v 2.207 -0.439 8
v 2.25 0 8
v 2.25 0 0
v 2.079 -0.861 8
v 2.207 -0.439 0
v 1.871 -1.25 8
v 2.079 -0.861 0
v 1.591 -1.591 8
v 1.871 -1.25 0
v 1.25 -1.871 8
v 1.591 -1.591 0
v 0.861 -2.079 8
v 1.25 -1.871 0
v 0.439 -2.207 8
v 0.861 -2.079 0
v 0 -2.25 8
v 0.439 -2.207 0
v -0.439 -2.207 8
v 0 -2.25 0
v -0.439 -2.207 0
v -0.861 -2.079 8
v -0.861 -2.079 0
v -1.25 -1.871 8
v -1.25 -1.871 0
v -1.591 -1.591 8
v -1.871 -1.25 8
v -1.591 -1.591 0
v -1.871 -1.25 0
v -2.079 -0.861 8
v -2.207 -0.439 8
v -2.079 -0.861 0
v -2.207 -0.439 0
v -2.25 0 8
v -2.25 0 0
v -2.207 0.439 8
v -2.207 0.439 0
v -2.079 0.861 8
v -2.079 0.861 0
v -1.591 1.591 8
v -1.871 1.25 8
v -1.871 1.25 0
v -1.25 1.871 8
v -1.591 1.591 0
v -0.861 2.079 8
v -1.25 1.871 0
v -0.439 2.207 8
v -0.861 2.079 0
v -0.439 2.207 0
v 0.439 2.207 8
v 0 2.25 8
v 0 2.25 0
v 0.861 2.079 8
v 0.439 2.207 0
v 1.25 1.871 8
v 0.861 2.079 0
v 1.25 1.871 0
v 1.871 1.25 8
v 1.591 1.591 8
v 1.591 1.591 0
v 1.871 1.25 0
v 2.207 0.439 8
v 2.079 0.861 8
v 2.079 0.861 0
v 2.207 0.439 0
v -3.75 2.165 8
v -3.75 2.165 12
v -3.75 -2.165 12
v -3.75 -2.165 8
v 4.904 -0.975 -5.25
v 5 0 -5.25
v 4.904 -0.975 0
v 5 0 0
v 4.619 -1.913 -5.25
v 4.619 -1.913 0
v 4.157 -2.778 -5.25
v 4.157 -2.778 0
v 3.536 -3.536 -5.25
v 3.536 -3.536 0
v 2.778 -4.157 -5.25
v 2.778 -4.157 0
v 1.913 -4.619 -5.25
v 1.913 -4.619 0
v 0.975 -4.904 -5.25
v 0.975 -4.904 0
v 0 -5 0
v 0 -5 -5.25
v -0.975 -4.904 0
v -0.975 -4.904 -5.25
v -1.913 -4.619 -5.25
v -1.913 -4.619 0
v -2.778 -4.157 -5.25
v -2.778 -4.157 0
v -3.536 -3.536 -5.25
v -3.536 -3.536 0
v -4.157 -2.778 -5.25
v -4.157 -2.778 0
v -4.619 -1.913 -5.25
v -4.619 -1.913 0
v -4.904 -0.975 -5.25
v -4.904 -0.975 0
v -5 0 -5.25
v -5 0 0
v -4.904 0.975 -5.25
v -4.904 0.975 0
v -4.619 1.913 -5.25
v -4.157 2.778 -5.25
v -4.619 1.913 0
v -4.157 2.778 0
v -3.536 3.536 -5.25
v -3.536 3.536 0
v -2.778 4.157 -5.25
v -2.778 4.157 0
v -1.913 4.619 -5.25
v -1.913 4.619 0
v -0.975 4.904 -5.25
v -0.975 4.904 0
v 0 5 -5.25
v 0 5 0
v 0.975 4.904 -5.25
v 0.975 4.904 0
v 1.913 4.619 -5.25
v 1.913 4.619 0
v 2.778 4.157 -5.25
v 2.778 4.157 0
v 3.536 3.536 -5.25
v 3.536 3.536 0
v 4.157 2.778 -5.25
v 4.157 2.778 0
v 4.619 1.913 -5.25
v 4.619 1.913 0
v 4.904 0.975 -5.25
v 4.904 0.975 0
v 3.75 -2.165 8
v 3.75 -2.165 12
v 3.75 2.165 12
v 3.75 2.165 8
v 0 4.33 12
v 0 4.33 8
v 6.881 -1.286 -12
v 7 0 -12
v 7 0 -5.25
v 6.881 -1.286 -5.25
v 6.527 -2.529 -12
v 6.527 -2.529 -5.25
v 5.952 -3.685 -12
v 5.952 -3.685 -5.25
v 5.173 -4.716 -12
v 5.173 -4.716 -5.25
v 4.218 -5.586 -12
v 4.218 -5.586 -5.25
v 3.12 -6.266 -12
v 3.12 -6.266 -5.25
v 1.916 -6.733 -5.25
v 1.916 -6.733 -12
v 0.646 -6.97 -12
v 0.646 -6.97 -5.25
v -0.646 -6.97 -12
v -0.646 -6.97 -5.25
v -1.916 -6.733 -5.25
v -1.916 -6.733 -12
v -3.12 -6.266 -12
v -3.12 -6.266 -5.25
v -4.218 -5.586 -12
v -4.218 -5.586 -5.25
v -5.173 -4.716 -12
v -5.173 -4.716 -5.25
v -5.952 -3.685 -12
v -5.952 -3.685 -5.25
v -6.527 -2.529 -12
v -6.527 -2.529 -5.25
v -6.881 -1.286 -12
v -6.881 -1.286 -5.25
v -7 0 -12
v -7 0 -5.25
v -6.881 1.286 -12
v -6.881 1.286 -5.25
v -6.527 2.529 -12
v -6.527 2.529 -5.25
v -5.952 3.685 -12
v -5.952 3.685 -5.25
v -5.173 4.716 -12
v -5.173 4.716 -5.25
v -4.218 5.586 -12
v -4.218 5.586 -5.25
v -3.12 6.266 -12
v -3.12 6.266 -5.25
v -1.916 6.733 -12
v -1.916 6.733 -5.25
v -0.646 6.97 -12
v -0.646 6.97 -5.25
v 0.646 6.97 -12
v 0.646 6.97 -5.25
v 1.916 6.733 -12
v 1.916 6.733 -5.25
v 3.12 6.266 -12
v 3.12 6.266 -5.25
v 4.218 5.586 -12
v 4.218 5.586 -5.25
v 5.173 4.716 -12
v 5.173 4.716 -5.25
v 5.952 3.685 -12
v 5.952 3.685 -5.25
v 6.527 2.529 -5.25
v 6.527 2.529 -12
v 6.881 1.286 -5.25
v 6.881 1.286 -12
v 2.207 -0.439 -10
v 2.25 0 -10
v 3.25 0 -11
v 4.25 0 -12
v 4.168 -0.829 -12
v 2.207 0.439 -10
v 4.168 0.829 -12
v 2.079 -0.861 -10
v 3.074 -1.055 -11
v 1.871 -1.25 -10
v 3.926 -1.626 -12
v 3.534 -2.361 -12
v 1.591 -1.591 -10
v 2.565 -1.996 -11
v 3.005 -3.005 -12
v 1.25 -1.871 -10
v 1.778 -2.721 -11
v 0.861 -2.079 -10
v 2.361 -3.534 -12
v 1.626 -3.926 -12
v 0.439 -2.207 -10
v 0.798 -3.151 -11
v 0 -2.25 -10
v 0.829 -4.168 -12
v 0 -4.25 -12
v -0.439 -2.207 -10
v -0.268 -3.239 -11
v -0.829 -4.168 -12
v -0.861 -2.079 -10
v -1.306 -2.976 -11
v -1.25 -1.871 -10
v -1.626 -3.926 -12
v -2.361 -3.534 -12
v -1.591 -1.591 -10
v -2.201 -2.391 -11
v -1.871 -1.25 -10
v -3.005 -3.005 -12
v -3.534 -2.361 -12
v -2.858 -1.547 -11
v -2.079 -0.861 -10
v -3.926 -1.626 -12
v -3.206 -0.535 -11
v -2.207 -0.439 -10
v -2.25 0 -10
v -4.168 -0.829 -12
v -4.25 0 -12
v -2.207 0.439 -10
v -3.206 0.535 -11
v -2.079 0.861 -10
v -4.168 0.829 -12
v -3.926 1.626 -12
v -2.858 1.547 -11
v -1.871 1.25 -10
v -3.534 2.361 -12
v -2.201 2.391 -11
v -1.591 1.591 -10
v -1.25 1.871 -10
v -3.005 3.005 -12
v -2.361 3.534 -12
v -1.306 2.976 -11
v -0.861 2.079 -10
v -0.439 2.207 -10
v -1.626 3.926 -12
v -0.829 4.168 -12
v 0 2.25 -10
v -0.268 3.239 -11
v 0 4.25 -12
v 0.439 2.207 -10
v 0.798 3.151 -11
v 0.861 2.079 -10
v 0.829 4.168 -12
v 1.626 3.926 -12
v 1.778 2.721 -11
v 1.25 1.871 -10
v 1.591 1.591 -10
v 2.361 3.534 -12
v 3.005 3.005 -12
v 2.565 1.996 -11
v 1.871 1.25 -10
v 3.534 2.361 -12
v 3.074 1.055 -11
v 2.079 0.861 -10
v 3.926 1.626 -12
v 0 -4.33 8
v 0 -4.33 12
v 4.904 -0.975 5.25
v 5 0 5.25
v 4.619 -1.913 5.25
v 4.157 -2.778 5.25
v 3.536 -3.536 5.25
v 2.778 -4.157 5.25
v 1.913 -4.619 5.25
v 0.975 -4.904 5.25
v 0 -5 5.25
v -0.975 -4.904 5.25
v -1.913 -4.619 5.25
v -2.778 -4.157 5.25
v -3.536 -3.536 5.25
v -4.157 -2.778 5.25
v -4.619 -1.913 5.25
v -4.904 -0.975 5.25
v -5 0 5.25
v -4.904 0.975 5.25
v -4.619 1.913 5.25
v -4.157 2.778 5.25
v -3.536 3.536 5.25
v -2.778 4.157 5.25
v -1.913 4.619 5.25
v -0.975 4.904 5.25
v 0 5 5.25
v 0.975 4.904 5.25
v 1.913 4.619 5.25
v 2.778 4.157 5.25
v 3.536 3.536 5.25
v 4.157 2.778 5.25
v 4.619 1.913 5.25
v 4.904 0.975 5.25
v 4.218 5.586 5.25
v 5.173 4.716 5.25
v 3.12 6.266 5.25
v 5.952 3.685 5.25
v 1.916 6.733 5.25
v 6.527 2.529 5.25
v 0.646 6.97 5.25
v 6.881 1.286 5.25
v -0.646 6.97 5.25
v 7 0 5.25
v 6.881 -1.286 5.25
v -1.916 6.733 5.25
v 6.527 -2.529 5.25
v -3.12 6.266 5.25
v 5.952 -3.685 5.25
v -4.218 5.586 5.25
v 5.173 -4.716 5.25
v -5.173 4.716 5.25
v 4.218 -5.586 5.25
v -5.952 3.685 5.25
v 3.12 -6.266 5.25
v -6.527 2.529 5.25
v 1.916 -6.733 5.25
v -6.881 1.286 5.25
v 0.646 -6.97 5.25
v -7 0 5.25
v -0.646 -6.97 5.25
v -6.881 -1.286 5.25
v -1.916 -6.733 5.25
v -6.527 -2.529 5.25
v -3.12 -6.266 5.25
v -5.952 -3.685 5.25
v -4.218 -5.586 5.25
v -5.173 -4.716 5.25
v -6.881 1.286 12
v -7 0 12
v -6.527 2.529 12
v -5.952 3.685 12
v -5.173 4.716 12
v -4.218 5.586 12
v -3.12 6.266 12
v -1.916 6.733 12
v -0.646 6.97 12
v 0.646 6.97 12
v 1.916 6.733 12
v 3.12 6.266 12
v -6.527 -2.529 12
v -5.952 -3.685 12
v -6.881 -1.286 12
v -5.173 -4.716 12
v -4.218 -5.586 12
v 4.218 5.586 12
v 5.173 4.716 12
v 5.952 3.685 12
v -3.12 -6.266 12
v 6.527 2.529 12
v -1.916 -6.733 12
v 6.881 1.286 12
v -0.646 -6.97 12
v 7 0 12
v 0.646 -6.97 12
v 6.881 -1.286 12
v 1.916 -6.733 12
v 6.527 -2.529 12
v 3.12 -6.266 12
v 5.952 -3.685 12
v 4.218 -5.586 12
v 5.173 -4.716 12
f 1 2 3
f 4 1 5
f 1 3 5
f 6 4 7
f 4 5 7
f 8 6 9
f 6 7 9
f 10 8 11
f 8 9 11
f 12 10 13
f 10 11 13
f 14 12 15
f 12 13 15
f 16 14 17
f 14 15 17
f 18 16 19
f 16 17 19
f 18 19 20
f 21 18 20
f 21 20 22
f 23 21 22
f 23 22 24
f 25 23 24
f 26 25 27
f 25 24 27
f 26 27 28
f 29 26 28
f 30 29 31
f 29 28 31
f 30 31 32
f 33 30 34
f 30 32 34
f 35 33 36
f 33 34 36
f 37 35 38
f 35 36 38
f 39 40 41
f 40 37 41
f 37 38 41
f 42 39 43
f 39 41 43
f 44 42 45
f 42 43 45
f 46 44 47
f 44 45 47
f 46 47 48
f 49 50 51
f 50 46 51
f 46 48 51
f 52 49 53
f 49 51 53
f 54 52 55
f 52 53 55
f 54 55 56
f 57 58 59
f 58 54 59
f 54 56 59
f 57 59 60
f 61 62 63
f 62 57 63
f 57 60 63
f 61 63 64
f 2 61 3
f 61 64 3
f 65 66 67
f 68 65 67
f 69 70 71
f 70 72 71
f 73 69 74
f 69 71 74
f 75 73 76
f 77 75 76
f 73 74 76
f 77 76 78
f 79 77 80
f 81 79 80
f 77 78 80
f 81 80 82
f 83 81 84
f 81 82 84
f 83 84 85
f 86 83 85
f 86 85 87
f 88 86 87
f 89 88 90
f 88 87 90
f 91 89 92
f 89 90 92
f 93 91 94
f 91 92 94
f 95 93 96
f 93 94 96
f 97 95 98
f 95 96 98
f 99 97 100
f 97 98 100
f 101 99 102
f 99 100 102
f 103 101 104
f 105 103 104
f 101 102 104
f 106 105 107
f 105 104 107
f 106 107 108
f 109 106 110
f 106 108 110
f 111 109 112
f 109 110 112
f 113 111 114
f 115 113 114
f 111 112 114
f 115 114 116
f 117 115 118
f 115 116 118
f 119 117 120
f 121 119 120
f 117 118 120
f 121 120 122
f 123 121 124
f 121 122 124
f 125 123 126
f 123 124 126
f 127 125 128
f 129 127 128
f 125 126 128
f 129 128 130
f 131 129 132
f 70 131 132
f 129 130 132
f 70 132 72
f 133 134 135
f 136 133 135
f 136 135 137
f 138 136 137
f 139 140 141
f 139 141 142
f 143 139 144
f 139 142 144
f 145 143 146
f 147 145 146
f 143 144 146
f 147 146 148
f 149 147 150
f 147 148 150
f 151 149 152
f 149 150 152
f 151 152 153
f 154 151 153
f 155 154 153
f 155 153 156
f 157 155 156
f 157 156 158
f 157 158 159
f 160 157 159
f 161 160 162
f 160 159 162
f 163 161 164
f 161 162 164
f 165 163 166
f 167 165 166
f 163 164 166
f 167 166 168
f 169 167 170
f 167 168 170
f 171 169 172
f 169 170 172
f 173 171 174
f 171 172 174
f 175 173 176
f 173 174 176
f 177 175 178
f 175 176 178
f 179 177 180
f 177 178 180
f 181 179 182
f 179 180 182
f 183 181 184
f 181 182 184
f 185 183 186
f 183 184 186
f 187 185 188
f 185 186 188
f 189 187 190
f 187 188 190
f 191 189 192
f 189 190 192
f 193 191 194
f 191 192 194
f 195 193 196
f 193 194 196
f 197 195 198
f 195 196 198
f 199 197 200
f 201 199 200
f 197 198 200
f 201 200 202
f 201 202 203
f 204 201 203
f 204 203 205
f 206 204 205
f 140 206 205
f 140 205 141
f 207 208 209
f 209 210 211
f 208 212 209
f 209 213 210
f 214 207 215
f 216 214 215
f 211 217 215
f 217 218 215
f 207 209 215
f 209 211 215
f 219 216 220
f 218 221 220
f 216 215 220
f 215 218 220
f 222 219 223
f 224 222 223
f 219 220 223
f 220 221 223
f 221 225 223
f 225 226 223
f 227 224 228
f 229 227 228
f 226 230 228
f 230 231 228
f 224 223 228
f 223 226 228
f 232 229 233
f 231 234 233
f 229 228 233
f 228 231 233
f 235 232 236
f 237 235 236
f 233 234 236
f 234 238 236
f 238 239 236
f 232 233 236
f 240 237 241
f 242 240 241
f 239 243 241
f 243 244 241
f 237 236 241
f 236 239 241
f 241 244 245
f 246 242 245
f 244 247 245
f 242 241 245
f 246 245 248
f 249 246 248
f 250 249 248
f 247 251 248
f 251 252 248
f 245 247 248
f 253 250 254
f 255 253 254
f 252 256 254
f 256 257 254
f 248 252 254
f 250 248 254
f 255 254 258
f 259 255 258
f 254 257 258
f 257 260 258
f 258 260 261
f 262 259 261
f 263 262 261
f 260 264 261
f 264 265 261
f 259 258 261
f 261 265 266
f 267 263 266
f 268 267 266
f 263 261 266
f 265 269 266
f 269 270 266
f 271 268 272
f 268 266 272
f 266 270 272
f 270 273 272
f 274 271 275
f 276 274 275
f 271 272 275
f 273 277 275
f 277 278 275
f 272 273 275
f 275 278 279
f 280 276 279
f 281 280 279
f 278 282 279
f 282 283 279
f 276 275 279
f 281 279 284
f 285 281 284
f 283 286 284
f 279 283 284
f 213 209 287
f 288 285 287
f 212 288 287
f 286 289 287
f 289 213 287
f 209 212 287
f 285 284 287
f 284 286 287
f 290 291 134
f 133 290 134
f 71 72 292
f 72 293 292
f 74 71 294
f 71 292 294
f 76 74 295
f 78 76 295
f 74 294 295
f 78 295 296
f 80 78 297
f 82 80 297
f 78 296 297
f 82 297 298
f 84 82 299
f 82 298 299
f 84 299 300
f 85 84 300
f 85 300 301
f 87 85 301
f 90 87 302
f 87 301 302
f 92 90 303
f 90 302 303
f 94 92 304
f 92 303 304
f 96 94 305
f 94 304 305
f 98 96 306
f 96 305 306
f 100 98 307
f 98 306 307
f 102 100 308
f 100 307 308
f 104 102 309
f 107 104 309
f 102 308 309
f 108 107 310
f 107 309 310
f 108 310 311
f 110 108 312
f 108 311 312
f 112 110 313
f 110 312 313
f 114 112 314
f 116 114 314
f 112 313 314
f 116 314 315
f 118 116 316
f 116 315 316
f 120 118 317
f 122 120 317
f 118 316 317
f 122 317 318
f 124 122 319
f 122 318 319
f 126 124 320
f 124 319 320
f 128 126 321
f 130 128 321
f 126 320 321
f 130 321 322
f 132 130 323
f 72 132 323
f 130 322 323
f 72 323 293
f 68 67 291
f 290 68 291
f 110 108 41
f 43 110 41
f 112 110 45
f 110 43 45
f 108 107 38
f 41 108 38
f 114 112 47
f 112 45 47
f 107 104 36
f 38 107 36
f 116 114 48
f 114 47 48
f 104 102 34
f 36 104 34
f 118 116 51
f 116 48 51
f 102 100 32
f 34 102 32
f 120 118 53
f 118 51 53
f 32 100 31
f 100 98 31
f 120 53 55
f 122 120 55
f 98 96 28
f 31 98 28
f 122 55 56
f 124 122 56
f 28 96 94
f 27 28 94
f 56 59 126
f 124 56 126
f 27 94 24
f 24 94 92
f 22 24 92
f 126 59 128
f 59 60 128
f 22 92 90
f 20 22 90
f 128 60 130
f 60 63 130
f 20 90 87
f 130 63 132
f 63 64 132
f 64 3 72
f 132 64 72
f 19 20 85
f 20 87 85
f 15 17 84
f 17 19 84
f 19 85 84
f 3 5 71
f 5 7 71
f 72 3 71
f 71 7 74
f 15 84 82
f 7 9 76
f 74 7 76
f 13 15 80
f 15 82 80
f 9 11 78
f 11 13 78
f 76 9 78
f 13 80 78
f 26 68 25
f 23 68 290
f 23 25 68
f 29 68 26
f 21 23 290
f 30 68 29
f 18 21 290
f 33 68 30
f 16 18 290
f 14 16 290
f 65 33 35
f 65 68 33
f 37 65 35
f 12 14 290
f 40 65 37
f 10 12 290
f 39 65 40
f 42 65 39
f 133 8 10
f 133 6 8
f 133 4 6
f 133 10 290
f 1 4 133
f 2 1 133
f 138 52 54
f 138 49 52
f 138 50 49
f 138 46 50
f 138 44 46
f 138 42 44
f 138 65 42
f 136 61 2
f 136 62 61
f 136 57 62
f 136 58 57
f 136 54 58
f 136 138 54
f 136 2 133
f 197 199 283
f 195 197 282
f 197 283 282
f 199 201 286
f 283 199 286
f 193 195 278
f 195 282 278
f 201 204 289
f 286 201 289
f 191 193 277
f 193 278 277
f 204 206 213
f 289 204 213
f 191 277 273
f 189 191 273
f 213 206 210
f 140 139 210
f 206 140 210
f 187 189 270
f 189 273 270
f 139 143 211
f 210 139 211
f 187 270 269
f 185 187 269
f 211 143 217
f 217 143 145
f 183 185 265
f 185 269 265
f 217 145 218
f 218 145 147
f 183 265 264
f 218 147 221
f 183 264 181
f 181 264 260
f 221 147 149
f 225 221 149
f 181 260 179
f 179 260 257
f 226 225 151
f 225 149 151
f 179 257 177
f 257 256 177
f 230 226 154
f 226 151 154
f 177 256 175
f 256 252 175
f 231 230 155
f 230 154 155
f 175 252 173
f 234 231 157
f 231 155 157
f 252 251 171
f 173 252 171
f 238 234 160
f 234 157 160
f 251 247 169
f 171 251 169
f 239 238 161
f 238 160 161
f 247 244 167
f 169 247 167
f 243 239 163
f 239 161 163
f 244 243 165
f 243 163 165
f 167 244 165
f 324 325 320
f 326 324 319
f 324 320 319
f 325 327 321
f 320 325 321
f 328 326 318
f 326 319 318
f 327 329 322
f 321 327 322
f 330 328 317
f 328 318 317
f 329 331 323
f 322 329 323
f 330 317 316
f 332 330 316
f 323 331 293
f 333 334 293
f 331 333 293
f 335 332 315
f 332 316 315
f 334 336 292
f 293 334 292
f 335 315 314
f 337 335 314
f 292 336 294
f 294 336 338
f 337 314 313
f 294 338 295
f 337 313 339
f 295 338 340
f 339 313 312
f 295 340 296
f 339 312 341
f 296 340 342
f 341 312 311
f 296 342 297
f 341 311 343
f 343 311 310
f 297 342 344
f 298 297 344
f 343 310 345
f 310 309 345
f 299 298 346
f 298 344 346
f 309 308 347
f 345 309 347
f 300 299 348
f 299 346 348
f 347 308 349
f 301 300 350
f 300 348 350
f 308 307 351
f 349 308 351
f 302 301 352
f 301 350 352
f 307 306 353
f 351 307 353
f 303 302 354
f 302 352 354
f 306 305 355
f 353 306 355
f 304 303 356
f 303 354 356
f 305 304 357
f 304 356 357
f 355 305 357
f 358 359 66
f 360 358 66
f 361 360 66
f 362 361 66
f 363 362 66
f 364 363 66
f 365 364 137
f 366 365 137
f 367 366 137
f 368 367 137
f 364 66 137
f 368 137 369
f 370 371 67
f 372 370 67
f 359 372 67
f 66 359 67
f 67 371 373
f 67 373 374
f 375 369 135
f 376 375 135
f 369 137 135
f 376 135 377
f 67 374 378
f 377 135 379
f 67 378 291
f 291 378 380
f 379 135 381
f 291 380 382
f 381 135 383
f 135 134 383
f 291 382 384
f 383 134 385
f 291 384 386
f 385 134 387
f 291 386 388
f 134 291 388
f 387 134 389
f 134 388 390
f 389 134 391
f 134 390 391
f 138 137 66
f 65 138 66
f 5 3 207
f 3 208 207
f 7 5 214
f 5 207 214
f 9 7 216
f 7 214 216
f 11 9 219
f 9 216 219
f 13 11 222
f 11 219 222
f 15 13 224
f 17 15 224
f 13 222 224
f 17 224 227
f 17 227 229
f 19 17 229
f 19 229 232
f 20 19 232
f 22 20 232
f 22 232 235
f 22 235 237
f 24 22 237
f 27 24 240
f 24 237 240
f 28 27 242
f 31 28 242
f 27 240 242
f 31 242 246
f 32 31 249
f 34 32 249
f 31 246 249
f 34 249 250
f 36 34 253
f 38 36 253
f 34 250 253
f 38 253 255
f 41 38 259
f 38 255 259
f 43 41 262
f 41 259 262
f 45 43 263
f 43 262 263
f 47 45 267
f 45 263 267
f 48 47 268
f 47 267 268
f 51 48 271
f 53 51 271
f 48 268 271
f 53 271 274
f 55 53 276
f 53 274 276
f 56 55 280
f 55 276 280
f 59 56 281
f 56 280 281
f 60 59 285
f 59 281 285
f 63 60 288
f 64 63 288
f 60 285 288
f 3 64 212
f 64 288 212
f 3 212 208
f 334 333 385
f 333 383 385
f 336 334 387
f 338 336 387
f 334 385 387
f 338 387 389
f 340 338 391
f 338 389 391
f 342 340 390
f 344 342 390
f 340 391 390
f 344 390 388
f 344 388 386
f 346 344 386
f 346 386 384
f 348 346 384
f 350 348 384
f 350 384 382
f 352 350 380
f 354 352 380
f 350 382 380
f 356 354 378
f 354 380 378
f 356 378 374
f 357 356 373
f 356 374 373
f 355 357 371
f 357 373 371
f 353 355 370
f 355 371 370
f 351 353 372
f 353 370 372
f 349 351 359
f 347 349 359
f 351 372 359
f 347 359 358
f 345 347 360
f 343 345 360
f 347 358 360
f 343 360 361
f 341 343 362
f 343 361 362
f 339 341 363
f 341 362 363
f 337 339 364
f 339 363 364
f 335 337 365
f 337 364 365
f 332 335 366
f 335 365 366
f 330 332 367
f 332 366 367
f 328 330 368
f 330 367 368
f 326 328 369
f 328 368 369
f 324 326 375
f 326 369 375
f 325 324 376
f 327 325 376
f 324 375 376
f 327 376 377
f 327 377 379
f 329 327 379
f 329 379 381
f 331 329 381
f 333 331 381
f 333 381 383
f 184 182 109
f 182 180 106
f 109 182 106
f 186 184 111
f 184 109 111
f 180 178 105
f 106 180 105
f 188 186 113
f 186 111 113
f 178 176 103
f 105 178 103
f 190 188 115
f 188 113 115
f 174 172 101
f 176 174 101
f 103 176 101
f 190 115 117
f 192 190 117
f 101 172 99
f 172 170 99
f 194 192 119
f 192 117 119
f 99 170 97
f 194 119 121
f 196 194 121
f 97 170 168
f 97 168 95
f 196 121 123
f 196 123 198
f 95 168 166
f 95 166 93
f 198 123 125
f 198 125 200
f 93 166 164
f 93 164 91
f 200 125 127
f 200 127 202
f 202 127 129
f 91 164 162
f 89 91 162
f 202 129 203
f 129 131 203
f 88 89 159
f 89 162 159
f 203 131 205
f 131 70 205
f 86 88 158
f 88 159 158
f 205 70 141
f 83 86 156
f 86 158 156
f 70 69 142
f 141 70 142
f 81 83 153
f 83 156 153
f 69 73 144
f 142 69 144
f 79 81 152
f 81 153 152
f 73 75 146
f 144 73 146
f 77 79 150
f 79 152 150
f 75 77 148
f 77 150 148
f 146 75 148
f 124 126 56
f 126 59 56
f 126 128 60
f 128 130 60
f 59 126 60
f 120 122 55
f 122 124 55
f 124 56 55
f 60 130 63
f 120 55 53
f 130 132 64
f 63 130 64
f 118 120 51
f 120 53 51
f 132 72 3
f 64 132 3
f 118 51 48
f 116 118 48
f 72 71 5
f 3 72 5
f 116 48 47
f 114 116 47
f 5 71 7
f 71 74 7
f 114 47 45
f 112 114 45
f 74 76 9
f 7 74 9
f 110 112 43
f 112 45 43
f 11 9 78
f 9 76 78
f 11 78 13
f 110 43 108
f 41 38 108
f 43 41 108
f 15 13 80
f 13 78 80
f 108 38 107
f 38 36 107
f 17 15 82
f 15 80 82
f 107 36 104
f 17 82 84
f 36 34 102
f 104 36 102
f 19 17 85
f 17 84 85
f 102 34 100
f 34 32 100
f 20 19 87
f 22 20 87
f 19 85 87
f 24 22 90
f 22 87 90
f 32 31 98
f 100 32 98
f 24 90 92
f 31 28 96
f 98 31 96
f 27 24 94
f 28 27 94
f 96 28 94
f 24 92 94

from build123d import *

# Parameters (mm, degrees)
F3_R     = 2.25
F4_DEPTH = 4


with BuildPart() as f1:
    # F0 (on Front) → F1 (revolve)
    with BuildSketch(Plane.XZ):
        Polygon((5, 0), (2.25, 0), (2.25, -10), (4.25, -12), (7, -12), (7, -5.25), (5, -5.25), align=None)
    revolve(axis=Axis((0, 0, -0.502397), (0, 0, -1)))


with BuildPart() as f2:
    # F0 (on Front) → F2 (revolve)
    with BuildSketch(Plane.XZ):
        Polygon((7, 12), (2.25, 12), (2.25, 0), (5, 0), (5, 5.25), (7, 5.25), align=None)
    revolve(axis=Axis((0, 0, -0.502397), (0, 0, -1)))

    # F3 (on face) → F4 (cut)
    with BuildSketch(Plane.XY.offset(12)):
        Polygon((-3.75, 2.165064), (-3.75, -2.165064), (0, -4.330127), (3.75, -2.165064), (3.75, 2.165064), (0, 4.330127), align=None)
        Circle(F3_R, mode=Mode.SUBTRACT)
    extrude(amount=-F4_DEPTH, mode=Mode.SUBTRACT)


solid = Compound([f1.part, f2.part])
